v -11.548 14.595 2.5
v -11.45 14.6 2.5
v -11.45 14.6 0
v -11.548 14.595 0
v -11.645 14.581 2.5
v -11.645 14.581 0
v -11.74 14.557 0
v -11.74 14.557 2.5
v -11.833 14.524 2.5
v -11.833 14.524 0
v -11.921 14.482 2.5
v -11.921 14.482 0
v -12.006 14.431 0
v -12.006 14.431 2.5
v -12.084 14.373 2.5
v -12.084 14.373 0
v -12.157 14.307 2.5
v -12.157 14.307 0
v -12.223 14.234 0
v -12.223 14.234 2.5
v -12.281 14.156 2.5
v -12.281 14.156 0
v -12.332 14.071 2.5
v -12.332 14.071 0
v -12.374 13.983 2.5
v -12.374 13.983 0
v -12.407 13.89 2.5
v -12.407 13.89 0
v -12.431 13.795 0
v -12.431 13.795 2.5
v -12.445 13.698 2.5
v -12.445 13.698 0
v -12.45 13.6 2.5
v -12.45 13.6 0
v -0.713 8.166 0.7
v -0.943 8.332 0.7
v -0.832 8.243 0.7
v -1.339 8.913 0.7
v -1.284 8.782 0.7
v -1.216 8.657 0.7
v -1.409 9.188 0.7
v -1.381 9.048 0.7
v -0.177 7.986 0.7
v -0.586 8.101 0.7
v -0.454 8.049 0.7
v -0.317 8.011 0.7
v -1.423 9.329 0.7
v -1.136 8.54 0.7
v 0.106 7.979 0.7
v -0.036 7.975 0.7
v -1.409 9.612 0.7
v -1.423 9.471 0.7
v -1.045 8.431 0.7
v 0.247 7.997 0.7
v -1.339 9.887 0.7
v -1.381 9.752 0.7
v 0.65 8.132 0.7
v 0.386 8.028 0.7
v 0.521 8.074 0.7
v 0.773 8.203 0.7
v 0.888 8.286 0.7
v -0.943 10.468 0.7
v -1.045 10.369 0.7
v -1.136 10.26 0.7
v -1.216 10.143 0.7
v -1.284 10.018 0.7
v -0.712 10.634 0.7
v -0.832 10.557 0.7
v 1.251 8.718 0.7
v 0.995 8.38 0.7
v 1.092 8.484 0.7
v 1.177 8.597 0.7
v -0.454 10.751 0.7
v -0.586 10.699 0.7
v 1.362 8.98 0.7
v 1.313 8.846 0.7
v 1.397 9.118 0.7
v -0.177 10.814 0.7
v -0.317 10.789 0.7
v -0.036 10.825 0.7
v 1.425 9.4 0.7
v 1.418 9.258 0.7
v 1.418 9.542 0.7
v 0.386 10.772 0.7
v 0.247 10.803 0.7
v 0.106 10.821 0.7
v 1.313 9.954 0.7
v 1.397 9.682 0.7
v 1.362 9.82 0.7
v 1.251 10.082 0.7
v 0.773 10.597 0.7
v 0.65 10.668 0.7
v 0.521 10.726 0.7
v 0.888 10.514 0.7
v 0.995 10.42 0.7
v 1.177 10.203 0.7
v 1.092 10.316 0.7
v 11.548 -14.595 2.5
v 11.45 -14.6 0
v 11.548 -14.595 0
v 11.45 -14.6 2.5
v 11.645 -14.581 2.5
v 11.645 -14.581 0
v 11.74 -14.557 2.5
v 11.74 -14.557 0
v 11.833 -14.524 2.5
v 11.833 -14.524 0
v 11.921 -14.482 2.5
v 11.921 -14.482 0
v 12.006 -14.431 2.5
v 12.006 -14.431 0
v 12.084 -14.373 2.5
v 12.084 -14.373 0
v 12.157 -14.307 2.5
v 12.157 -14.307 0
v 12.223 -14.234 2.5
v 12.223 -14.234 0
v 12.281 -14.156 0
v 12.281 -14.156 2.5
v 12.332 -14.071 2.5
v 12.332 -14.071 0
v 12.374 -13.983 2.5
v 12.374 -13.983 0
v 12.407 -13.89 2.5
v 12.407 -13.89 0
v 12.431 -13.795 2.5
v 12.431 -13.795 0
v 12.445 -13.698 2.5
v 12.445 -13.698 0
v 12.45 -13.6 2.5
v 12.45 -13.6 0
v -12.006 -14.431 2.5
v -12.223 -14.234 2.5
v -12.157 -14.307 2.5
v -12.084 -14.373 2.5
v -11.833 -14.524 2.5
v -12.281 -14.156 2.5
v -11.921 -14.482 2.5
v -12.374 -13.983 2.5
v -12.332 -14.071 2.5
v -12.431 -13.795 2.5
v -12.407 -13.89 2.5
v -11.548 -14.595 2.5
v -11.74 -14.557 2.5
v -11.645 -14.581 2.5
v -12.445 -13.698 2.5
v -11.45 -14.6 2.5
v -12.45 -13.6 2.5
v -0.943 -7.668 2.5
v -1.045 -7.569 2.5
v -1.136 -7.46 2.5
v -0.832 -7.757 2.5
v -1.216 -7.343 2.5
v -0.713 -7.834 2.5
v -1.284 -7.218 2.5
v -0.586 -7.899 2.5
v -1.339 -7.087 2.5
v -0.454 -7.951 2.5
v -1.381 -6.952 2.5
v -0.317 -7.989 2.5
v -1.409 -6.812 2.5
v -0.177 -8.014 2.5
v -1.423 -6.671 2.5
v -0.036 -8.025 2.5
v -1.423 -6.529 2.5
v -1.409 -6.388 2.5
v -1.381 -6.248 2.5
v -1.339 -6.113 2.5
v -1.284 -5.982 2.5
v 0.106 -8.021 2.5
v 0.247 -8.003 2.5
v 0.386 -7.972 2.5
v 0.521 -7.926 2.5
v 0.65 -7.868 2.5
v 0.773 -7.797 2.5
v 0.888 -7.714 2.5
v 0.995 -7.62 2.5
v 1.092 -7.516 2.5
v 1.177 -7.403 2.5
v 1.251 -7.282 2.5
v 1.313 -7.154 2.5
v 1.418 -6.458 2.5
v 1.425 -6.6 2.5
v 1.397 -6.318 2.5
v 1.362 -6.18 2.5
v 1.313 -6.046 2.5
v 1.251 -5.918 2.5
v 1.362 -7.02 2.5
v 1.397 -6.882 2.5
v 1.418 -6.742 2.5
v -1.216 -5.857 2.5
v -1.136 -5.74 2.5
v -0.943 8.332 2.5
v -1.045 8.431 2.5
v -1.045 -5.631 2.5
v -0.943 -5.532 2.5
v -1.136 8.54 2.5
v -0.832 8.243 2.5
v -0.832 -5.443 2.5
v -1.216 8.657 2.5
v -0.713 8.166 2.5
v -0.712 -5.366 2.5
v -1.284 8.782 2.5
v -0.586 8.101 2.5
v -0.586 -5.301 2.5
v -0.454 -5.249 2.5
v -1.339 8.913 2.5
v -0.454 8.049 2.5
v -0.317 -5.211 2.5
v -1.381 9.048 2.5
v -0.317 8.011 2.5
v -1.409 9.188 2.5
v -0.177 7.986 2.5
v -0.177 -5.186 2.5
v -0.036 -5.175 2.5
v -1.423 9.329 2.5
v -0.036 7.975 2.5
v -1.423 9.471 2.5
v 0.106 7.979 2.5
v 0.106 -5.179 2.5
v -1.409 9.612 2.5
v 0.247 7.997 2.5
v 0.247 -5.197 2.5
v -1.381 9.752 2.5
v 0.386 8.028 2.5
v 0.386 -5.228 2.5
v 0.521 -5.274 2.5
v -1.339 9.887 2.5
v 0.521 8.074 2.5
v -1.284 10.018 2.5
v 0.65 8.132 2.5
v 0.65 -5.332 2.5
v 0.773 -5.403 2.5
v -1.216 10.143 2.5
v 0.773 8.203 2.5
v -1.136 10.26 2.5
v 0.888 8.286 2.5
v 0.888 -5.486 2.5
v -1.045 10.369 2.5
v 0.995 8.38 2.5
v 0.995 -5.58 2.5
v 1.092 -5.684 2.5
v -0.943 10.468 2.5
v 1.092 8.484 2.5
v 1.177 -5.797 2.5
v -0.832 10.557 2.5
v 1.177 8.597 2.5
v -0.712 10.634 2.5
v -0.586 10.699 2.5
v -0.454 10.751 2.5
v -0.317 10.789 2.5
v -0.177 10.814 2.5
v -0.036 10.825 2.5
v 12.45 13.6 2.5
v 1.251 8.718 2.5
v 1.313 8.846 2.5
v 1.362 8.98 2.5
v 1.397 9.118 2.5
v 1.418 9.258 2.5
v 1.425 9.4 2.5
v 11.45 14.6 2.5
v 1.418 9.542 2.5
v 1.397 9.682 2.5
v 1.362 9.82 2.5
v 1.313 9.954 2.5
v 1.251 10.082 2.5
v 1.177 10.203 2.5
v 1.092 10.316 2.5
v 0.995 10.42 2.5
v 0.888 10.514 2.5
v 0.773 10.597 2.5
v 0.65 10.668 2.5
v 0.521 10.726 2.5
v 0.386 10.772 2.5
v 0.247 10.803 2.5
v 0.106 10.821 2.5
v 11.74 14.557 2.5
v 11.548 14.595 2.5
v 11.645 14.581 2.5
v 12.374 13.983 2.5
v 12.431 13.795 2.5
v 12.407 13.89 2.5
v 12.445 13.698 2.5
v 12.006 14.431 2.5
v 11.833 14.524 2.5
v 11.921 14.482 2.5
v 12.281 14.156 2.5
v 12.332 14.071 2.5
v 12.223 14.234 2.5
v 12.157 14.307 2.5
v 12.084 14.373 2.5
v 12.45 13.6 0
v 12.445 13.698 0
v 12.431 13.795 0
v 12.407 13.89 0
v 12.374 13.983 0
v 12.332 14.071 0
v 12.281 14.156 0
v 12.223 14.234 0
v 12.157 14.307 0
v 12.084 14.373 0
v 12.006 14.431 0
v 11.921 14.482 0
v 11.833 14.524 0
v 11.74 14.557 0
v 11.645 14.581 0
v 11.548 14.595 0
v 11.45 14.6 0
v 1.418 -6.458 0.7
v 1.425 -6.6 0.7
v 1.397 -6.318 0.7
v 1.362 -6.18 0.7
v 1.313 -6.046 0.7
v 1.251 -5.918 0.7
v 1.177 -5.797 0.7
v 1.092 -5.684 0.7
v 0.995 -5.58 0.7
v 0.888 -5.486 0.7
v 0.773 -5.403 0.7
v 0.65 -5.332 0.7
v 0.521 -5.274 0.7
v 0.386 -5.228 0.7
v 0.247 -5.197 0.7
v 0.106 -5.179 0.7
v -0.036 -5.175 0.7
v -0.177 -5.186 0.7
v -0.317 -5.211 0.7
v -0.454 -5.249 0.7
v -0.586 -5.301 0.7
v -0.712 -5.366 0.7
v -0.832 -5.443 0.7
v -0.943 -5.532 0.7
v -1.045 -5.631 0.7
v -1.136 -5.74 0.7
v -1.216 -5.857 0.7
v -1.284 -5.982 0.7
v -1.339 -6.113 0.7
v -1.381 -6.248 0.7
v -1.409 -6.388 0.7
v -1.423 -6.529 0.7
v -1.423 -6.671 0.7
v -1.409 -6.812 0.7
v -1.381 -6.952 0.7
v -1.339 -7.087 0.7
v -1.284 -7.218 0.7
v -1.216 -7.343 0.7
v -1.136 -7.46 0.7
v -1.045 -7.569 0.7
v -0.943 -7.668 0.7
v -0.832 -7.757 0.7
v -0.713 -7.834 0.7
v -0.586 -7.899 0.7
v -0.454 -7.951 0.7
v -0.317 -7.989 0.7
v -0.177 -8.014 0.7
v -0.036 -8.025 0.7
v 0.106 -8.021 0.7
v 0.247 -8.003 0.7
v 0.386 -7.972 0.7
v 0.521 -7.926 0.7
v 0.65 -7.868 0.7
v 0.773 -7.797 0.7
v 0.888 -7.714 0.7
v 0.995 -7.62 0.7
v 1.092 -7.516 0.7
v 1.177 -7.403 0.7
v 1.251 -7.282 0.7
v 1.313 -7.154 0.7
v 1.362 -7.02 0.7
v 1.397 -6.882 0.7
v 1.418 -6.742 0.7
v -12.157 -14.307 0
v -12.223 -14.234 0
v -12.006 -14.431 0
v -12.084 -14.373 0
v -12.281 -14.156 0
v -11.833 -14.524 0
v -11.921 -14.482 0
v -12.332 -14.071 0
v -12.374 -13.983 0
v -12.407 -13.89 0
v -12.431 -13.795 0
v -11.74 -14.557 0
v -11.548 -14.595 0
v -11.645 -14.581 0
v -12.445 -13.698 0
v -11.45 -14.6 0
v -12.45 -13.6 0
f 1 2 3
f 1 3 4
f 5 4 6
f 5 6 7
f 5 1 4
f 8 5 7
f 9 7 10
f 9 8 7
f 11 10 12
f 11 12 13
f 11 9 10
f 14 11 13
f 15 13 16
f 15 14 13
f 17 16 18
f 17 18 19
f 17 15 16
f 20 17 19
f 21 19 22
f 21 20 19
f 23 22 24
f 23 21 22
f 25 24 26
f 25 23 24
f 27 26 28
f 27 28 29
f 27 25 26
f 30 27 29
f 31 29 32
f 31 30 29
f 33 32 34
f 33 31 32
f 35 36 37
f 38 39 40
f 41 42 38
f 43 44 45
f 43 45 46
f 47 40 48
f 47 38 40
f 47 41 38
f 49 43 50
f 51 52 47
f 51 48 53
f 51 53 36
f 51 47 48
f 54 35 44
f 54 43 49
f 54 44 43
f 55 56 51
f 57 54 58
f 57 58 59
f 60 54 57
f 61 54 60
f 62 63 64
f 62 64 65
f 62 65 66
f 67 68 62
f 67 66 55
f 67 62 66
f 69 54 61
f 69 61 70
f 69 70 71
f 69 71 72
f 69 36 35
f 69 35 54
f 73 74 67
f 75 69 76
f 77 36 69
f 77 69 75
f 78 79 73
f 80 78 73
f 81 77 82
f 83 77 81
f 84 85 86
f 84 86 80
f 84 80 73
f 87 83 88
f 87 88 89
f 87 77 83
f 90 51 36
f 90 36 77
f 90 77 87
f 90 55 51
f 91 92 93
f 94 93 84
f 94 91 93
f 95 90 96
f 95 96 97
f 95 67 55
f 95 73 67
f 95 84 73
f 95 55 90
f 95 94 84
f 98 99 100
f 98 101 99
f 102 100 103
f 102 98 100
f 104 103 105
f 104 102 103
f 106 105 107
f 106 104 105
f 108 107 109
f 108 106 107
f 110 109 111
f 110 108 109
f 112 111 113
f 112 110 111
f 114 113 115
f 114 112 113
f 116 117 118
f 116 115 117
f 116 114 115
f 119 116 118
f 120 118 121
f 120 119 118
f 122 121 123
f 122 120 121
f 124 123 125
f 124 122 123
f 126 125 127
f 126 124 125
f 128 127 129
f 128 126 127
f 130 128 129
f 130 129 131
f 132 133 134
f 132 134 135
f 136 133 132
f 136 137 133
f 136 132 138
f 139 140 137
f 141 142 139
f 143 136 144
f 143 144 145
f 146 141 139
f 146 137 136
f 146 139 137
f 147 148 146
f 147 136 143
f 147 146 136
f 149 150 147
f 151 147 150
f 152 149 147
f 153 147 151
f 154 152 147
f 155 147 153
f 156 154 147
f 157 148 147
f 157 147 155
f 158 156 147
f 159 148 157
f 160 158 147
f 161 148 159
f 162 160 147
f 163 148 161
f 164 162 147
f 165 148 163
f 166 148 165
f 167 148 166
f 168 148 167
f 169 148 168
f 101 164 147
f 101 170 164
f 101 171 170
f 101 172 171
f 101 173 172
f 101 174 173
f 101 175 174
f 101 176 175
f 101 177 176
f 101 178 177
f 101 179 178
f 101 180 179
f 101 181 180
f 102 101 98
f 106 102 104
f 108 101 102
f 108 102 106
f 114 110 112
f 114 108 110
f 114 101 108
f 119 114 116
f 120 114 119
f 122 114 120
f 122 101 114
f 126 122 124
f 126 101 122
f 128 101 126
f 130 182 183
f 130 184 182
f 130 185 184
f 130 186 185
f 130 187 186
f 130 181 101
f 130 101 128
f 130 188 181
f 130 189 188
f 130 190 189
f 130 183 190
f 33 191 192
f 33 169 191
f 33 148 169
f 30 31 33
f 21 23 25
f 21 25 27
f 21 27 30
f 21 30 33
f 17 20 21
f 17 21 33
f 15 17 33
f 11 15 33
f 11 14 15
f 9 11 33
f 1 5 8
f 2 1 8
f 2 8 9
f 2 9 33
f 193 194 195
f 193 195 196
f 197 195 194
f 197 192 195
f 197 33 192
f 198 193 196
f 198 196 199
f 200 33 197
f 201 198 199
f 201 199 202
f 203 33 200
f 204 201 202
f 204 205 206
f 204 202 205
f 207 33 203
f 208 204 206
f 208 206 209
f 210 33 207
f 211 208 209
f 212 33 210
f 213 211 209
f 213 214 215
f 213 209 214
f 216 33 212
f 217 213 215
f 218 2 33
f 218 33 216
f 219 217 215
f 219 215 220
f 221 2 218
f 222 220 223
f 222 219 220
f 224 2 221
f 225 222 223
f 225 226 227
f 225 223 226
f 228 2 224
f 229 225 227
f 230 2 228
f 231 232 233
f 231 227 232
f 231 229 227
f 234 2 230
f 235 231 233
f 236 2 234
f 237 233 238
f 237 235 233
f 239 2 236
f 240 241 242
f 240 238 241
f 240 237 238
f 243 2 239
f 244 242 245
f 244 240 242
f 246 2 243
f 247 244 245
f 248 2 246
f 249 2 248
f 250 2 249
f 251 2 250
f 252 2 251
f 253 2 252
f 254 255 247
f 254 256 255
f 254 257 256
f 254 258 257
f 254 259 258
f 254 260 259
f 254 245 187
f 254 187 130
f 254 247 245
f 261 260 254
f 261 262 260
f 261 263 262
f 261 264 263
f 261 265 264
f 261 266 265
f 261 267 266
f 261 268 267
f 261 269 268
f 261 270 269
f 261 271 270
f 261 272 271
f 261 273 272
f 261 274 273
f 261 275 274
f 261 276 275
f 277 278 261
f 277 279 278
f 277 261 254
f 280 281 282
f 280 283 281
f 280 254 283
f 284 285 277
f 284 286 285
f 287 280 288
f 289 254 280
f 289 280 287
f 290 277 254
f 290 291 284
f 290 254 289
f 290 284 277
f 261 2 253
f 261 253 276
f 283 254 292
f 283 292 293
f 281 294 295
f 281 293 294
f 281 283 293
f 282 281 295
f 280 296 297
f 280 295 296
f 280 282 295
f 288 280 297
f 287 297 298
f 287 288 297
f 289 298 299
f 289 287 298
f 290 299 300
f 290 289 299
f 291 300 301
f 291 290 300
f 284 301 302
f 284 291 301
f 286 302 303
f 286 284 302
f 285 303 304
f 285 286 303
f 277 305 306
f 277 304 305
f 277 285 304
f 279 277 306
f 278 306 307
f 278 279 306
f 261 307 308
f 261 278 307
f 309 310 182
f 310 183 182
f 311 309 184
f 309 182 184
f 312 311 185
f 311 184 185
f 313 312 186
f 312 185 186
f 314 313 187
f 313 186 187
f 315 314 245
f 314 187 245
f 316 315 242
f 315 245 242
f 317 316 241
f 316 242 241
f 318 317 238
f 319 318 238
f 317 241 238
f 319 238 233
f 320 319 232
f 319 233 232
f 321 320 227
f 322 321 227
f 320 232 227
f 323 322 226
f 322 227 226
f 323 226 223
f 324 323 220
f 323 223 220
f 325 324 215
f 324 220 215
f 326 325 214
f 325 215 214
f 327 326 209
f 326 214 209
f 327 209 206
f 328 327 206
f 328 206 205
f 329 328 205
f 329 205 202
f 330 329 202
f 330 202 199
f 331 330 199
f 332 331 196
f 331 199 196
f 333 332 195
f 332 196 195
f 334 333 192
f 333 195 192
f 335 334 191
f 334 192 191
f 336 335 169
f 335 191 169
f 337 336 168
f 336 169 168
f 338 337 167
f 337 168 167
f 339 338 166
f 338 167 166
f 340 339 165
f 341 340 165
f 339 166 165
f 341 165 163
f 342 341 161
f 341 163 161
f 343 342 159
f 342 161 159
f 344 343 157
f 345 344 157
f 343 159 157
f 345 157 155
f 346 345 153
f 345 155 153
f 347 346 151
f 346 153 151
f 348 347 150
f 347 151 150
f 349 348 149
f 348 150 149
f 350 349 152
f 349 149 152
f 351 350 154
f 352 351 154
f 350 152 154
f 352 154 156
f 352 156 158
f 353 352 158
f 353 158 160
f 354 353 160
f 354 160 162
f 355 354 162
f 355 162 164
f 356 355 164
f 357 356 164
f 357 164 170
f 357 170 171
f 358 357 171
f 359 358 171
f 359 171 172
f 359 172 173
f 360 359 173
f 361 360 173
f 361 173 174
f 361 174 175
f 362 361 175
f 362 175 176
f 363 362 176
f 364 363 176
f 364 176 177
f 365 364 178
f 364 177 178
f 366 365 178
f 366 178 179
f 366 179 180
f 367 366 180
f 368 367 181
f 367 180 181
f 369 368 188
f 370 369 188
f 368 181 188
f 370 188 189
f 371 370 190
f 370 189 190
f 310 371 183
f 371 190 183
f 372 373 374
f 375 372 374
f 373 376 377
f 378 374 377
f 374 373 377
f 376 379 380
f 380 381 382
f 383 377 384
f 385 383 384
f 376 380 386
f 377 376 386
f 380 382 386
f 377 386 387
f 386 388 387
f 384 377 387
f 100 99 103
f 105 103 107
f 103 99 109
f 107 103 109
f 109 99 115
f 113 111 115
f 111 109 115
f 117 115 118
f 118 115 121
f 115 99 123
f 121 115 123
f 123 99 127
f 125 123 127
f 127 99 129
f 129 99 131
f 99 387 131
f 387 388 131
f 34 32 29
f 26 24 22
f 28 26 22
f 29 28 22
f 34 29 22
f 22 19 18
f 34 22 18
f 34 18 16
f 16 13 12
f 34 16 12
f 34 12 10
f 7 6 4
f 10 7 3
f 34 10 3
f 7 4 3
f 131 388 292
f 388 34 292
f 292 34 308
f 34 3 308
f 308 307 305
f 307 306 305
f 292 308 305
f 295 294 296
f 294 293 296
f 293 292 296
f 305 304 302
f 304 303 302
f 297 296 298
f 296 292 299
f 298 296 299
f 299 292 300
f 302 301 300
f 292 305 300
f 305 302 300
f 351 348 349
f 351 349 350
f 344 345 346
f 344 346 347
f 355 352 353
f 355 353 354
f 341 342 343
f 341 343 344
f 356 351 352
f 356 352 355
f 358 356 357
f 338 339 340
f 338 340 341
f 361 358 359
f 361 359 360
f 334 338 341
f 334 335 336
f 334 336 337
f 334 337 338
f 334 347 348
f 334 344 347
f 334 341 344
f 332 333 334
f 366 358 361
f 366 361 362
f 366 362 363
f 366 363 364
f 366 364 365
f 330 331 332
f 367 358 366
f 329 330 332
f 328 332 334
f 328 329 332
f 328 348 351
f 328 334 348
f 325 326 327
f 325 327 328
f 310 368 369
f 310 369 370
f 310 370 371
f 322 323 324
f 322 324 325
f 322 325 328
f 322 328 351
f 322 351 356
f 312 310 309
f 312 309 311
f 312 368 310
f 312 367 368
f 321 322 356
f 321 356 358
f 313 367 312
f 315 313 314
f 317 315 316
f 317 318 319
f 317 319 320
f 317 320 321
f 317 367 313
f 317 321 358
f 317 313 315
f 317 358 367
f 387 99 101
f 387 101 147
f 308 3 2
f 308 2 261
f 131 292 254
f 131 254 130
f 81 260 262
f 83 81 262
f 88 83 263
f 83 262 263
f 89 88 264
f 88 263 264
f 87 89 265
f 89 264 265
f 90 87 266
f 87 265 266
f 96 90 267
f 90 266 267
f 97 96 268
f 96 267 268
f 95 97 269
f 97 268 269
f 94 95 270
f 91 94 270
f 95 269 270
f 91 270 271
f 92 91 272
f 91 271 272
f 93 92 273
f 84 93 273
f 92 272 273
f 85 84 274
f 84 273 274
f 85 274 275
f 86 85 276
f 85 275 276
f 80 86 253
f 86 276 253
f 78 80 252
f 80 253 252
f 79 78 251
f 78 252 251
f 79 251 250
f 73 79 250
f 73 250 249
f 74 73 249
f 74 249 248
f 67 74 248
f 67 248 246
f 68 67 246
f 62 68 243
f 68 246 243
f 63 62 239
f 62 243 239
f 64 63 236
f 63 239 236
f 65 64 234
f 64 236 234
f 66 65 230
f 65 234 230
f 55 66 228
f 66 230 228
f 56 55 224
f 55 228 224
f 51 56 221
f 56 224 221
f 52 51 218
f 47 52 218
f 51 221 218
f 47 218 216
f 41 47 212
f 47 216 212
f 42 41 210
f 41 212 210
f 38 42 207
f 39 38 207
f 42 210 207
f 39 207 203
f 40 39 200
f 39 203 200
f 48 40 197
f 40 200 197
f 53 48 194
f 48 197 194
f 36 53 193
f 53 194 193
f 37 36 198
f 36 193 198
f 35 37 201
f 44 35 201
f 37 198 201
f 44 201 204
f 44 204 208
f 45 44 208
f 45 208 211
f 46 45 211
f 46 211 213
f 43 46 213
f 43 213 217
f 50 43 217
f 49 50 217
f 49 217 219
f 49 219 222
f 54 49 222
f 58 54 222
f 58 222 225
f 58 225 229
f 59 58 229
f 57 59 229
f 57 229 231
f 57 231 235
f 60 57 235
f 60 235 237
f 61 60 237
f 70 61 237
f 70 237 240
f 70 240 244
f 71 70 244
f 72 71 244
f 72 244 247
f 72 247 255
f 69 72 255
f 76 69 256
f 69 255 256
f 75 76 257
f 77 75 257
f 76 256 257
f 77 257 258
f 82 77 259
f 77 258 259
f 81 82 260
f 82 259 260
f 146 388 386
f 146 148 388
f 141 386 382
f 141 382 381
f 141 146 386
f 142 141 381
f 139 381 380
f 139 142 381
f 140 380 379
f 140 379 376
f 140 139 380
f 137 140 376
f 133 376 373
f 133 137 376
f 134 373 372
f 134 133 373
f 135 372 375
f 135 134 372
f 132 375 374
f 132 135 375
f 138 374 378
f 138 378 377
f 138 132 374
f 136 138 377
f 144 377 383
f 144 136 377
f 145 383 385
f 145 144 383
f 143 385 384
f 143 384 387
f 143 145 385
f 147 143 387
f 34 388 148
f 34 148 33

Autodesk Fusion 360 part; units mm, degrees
sketch "Sketch1" plane through (0, 0, 0) normal (0, 0, 1) x (1, 0, 0)
  line L0 (-12.45, 14.6) -> (12.45, 14.6)
  line L1 (12.45, 14.6) -> (12.45, -14.6)
  line L2 (12.45, -14.6) -> (-12.45, -14.6)
  line L3 (-12.45, -14.6) -> (-12.45, 14.6)
  line L4 (-12.45, -14.6) -> (12.45, 14.6) construction
  circle A0 centre (0, -6.6) radius 1.425
  circle A1 centre (0, -6.6) radius 2.75
  line L5 (0, 14.6) -> (0, -14.6) construction
  circle A2 centre (0, 9.4) radius 1.425
  circle A3 centre (0, 9.4) radius 2.75
  dimension "d1" = 24.9
  dimension "d2" = 29.2
  dimension "d92" = 2.85
  dimension "d98" = 5.5
  dimension "d141" = 8
  dimension "d142" = 16
extrude "Extrude1" add sketch "Sketch1" along normal blind 2.5 contours L0 L1 L2 L3 | A0 | A1 | A2 | A3
extrude "Extrude2" cut sketch "Sketch1" against normal blind 1.8 from surface at 2.5 contours A0 | A2
fillet "Fillet1" radius 1 4 edges at (-12.45, 14.6, 1.25) (12.45, 14.6, 1.25) (-12.45, -14.6, 1.25) (12.45, -14.6, 1.25)
